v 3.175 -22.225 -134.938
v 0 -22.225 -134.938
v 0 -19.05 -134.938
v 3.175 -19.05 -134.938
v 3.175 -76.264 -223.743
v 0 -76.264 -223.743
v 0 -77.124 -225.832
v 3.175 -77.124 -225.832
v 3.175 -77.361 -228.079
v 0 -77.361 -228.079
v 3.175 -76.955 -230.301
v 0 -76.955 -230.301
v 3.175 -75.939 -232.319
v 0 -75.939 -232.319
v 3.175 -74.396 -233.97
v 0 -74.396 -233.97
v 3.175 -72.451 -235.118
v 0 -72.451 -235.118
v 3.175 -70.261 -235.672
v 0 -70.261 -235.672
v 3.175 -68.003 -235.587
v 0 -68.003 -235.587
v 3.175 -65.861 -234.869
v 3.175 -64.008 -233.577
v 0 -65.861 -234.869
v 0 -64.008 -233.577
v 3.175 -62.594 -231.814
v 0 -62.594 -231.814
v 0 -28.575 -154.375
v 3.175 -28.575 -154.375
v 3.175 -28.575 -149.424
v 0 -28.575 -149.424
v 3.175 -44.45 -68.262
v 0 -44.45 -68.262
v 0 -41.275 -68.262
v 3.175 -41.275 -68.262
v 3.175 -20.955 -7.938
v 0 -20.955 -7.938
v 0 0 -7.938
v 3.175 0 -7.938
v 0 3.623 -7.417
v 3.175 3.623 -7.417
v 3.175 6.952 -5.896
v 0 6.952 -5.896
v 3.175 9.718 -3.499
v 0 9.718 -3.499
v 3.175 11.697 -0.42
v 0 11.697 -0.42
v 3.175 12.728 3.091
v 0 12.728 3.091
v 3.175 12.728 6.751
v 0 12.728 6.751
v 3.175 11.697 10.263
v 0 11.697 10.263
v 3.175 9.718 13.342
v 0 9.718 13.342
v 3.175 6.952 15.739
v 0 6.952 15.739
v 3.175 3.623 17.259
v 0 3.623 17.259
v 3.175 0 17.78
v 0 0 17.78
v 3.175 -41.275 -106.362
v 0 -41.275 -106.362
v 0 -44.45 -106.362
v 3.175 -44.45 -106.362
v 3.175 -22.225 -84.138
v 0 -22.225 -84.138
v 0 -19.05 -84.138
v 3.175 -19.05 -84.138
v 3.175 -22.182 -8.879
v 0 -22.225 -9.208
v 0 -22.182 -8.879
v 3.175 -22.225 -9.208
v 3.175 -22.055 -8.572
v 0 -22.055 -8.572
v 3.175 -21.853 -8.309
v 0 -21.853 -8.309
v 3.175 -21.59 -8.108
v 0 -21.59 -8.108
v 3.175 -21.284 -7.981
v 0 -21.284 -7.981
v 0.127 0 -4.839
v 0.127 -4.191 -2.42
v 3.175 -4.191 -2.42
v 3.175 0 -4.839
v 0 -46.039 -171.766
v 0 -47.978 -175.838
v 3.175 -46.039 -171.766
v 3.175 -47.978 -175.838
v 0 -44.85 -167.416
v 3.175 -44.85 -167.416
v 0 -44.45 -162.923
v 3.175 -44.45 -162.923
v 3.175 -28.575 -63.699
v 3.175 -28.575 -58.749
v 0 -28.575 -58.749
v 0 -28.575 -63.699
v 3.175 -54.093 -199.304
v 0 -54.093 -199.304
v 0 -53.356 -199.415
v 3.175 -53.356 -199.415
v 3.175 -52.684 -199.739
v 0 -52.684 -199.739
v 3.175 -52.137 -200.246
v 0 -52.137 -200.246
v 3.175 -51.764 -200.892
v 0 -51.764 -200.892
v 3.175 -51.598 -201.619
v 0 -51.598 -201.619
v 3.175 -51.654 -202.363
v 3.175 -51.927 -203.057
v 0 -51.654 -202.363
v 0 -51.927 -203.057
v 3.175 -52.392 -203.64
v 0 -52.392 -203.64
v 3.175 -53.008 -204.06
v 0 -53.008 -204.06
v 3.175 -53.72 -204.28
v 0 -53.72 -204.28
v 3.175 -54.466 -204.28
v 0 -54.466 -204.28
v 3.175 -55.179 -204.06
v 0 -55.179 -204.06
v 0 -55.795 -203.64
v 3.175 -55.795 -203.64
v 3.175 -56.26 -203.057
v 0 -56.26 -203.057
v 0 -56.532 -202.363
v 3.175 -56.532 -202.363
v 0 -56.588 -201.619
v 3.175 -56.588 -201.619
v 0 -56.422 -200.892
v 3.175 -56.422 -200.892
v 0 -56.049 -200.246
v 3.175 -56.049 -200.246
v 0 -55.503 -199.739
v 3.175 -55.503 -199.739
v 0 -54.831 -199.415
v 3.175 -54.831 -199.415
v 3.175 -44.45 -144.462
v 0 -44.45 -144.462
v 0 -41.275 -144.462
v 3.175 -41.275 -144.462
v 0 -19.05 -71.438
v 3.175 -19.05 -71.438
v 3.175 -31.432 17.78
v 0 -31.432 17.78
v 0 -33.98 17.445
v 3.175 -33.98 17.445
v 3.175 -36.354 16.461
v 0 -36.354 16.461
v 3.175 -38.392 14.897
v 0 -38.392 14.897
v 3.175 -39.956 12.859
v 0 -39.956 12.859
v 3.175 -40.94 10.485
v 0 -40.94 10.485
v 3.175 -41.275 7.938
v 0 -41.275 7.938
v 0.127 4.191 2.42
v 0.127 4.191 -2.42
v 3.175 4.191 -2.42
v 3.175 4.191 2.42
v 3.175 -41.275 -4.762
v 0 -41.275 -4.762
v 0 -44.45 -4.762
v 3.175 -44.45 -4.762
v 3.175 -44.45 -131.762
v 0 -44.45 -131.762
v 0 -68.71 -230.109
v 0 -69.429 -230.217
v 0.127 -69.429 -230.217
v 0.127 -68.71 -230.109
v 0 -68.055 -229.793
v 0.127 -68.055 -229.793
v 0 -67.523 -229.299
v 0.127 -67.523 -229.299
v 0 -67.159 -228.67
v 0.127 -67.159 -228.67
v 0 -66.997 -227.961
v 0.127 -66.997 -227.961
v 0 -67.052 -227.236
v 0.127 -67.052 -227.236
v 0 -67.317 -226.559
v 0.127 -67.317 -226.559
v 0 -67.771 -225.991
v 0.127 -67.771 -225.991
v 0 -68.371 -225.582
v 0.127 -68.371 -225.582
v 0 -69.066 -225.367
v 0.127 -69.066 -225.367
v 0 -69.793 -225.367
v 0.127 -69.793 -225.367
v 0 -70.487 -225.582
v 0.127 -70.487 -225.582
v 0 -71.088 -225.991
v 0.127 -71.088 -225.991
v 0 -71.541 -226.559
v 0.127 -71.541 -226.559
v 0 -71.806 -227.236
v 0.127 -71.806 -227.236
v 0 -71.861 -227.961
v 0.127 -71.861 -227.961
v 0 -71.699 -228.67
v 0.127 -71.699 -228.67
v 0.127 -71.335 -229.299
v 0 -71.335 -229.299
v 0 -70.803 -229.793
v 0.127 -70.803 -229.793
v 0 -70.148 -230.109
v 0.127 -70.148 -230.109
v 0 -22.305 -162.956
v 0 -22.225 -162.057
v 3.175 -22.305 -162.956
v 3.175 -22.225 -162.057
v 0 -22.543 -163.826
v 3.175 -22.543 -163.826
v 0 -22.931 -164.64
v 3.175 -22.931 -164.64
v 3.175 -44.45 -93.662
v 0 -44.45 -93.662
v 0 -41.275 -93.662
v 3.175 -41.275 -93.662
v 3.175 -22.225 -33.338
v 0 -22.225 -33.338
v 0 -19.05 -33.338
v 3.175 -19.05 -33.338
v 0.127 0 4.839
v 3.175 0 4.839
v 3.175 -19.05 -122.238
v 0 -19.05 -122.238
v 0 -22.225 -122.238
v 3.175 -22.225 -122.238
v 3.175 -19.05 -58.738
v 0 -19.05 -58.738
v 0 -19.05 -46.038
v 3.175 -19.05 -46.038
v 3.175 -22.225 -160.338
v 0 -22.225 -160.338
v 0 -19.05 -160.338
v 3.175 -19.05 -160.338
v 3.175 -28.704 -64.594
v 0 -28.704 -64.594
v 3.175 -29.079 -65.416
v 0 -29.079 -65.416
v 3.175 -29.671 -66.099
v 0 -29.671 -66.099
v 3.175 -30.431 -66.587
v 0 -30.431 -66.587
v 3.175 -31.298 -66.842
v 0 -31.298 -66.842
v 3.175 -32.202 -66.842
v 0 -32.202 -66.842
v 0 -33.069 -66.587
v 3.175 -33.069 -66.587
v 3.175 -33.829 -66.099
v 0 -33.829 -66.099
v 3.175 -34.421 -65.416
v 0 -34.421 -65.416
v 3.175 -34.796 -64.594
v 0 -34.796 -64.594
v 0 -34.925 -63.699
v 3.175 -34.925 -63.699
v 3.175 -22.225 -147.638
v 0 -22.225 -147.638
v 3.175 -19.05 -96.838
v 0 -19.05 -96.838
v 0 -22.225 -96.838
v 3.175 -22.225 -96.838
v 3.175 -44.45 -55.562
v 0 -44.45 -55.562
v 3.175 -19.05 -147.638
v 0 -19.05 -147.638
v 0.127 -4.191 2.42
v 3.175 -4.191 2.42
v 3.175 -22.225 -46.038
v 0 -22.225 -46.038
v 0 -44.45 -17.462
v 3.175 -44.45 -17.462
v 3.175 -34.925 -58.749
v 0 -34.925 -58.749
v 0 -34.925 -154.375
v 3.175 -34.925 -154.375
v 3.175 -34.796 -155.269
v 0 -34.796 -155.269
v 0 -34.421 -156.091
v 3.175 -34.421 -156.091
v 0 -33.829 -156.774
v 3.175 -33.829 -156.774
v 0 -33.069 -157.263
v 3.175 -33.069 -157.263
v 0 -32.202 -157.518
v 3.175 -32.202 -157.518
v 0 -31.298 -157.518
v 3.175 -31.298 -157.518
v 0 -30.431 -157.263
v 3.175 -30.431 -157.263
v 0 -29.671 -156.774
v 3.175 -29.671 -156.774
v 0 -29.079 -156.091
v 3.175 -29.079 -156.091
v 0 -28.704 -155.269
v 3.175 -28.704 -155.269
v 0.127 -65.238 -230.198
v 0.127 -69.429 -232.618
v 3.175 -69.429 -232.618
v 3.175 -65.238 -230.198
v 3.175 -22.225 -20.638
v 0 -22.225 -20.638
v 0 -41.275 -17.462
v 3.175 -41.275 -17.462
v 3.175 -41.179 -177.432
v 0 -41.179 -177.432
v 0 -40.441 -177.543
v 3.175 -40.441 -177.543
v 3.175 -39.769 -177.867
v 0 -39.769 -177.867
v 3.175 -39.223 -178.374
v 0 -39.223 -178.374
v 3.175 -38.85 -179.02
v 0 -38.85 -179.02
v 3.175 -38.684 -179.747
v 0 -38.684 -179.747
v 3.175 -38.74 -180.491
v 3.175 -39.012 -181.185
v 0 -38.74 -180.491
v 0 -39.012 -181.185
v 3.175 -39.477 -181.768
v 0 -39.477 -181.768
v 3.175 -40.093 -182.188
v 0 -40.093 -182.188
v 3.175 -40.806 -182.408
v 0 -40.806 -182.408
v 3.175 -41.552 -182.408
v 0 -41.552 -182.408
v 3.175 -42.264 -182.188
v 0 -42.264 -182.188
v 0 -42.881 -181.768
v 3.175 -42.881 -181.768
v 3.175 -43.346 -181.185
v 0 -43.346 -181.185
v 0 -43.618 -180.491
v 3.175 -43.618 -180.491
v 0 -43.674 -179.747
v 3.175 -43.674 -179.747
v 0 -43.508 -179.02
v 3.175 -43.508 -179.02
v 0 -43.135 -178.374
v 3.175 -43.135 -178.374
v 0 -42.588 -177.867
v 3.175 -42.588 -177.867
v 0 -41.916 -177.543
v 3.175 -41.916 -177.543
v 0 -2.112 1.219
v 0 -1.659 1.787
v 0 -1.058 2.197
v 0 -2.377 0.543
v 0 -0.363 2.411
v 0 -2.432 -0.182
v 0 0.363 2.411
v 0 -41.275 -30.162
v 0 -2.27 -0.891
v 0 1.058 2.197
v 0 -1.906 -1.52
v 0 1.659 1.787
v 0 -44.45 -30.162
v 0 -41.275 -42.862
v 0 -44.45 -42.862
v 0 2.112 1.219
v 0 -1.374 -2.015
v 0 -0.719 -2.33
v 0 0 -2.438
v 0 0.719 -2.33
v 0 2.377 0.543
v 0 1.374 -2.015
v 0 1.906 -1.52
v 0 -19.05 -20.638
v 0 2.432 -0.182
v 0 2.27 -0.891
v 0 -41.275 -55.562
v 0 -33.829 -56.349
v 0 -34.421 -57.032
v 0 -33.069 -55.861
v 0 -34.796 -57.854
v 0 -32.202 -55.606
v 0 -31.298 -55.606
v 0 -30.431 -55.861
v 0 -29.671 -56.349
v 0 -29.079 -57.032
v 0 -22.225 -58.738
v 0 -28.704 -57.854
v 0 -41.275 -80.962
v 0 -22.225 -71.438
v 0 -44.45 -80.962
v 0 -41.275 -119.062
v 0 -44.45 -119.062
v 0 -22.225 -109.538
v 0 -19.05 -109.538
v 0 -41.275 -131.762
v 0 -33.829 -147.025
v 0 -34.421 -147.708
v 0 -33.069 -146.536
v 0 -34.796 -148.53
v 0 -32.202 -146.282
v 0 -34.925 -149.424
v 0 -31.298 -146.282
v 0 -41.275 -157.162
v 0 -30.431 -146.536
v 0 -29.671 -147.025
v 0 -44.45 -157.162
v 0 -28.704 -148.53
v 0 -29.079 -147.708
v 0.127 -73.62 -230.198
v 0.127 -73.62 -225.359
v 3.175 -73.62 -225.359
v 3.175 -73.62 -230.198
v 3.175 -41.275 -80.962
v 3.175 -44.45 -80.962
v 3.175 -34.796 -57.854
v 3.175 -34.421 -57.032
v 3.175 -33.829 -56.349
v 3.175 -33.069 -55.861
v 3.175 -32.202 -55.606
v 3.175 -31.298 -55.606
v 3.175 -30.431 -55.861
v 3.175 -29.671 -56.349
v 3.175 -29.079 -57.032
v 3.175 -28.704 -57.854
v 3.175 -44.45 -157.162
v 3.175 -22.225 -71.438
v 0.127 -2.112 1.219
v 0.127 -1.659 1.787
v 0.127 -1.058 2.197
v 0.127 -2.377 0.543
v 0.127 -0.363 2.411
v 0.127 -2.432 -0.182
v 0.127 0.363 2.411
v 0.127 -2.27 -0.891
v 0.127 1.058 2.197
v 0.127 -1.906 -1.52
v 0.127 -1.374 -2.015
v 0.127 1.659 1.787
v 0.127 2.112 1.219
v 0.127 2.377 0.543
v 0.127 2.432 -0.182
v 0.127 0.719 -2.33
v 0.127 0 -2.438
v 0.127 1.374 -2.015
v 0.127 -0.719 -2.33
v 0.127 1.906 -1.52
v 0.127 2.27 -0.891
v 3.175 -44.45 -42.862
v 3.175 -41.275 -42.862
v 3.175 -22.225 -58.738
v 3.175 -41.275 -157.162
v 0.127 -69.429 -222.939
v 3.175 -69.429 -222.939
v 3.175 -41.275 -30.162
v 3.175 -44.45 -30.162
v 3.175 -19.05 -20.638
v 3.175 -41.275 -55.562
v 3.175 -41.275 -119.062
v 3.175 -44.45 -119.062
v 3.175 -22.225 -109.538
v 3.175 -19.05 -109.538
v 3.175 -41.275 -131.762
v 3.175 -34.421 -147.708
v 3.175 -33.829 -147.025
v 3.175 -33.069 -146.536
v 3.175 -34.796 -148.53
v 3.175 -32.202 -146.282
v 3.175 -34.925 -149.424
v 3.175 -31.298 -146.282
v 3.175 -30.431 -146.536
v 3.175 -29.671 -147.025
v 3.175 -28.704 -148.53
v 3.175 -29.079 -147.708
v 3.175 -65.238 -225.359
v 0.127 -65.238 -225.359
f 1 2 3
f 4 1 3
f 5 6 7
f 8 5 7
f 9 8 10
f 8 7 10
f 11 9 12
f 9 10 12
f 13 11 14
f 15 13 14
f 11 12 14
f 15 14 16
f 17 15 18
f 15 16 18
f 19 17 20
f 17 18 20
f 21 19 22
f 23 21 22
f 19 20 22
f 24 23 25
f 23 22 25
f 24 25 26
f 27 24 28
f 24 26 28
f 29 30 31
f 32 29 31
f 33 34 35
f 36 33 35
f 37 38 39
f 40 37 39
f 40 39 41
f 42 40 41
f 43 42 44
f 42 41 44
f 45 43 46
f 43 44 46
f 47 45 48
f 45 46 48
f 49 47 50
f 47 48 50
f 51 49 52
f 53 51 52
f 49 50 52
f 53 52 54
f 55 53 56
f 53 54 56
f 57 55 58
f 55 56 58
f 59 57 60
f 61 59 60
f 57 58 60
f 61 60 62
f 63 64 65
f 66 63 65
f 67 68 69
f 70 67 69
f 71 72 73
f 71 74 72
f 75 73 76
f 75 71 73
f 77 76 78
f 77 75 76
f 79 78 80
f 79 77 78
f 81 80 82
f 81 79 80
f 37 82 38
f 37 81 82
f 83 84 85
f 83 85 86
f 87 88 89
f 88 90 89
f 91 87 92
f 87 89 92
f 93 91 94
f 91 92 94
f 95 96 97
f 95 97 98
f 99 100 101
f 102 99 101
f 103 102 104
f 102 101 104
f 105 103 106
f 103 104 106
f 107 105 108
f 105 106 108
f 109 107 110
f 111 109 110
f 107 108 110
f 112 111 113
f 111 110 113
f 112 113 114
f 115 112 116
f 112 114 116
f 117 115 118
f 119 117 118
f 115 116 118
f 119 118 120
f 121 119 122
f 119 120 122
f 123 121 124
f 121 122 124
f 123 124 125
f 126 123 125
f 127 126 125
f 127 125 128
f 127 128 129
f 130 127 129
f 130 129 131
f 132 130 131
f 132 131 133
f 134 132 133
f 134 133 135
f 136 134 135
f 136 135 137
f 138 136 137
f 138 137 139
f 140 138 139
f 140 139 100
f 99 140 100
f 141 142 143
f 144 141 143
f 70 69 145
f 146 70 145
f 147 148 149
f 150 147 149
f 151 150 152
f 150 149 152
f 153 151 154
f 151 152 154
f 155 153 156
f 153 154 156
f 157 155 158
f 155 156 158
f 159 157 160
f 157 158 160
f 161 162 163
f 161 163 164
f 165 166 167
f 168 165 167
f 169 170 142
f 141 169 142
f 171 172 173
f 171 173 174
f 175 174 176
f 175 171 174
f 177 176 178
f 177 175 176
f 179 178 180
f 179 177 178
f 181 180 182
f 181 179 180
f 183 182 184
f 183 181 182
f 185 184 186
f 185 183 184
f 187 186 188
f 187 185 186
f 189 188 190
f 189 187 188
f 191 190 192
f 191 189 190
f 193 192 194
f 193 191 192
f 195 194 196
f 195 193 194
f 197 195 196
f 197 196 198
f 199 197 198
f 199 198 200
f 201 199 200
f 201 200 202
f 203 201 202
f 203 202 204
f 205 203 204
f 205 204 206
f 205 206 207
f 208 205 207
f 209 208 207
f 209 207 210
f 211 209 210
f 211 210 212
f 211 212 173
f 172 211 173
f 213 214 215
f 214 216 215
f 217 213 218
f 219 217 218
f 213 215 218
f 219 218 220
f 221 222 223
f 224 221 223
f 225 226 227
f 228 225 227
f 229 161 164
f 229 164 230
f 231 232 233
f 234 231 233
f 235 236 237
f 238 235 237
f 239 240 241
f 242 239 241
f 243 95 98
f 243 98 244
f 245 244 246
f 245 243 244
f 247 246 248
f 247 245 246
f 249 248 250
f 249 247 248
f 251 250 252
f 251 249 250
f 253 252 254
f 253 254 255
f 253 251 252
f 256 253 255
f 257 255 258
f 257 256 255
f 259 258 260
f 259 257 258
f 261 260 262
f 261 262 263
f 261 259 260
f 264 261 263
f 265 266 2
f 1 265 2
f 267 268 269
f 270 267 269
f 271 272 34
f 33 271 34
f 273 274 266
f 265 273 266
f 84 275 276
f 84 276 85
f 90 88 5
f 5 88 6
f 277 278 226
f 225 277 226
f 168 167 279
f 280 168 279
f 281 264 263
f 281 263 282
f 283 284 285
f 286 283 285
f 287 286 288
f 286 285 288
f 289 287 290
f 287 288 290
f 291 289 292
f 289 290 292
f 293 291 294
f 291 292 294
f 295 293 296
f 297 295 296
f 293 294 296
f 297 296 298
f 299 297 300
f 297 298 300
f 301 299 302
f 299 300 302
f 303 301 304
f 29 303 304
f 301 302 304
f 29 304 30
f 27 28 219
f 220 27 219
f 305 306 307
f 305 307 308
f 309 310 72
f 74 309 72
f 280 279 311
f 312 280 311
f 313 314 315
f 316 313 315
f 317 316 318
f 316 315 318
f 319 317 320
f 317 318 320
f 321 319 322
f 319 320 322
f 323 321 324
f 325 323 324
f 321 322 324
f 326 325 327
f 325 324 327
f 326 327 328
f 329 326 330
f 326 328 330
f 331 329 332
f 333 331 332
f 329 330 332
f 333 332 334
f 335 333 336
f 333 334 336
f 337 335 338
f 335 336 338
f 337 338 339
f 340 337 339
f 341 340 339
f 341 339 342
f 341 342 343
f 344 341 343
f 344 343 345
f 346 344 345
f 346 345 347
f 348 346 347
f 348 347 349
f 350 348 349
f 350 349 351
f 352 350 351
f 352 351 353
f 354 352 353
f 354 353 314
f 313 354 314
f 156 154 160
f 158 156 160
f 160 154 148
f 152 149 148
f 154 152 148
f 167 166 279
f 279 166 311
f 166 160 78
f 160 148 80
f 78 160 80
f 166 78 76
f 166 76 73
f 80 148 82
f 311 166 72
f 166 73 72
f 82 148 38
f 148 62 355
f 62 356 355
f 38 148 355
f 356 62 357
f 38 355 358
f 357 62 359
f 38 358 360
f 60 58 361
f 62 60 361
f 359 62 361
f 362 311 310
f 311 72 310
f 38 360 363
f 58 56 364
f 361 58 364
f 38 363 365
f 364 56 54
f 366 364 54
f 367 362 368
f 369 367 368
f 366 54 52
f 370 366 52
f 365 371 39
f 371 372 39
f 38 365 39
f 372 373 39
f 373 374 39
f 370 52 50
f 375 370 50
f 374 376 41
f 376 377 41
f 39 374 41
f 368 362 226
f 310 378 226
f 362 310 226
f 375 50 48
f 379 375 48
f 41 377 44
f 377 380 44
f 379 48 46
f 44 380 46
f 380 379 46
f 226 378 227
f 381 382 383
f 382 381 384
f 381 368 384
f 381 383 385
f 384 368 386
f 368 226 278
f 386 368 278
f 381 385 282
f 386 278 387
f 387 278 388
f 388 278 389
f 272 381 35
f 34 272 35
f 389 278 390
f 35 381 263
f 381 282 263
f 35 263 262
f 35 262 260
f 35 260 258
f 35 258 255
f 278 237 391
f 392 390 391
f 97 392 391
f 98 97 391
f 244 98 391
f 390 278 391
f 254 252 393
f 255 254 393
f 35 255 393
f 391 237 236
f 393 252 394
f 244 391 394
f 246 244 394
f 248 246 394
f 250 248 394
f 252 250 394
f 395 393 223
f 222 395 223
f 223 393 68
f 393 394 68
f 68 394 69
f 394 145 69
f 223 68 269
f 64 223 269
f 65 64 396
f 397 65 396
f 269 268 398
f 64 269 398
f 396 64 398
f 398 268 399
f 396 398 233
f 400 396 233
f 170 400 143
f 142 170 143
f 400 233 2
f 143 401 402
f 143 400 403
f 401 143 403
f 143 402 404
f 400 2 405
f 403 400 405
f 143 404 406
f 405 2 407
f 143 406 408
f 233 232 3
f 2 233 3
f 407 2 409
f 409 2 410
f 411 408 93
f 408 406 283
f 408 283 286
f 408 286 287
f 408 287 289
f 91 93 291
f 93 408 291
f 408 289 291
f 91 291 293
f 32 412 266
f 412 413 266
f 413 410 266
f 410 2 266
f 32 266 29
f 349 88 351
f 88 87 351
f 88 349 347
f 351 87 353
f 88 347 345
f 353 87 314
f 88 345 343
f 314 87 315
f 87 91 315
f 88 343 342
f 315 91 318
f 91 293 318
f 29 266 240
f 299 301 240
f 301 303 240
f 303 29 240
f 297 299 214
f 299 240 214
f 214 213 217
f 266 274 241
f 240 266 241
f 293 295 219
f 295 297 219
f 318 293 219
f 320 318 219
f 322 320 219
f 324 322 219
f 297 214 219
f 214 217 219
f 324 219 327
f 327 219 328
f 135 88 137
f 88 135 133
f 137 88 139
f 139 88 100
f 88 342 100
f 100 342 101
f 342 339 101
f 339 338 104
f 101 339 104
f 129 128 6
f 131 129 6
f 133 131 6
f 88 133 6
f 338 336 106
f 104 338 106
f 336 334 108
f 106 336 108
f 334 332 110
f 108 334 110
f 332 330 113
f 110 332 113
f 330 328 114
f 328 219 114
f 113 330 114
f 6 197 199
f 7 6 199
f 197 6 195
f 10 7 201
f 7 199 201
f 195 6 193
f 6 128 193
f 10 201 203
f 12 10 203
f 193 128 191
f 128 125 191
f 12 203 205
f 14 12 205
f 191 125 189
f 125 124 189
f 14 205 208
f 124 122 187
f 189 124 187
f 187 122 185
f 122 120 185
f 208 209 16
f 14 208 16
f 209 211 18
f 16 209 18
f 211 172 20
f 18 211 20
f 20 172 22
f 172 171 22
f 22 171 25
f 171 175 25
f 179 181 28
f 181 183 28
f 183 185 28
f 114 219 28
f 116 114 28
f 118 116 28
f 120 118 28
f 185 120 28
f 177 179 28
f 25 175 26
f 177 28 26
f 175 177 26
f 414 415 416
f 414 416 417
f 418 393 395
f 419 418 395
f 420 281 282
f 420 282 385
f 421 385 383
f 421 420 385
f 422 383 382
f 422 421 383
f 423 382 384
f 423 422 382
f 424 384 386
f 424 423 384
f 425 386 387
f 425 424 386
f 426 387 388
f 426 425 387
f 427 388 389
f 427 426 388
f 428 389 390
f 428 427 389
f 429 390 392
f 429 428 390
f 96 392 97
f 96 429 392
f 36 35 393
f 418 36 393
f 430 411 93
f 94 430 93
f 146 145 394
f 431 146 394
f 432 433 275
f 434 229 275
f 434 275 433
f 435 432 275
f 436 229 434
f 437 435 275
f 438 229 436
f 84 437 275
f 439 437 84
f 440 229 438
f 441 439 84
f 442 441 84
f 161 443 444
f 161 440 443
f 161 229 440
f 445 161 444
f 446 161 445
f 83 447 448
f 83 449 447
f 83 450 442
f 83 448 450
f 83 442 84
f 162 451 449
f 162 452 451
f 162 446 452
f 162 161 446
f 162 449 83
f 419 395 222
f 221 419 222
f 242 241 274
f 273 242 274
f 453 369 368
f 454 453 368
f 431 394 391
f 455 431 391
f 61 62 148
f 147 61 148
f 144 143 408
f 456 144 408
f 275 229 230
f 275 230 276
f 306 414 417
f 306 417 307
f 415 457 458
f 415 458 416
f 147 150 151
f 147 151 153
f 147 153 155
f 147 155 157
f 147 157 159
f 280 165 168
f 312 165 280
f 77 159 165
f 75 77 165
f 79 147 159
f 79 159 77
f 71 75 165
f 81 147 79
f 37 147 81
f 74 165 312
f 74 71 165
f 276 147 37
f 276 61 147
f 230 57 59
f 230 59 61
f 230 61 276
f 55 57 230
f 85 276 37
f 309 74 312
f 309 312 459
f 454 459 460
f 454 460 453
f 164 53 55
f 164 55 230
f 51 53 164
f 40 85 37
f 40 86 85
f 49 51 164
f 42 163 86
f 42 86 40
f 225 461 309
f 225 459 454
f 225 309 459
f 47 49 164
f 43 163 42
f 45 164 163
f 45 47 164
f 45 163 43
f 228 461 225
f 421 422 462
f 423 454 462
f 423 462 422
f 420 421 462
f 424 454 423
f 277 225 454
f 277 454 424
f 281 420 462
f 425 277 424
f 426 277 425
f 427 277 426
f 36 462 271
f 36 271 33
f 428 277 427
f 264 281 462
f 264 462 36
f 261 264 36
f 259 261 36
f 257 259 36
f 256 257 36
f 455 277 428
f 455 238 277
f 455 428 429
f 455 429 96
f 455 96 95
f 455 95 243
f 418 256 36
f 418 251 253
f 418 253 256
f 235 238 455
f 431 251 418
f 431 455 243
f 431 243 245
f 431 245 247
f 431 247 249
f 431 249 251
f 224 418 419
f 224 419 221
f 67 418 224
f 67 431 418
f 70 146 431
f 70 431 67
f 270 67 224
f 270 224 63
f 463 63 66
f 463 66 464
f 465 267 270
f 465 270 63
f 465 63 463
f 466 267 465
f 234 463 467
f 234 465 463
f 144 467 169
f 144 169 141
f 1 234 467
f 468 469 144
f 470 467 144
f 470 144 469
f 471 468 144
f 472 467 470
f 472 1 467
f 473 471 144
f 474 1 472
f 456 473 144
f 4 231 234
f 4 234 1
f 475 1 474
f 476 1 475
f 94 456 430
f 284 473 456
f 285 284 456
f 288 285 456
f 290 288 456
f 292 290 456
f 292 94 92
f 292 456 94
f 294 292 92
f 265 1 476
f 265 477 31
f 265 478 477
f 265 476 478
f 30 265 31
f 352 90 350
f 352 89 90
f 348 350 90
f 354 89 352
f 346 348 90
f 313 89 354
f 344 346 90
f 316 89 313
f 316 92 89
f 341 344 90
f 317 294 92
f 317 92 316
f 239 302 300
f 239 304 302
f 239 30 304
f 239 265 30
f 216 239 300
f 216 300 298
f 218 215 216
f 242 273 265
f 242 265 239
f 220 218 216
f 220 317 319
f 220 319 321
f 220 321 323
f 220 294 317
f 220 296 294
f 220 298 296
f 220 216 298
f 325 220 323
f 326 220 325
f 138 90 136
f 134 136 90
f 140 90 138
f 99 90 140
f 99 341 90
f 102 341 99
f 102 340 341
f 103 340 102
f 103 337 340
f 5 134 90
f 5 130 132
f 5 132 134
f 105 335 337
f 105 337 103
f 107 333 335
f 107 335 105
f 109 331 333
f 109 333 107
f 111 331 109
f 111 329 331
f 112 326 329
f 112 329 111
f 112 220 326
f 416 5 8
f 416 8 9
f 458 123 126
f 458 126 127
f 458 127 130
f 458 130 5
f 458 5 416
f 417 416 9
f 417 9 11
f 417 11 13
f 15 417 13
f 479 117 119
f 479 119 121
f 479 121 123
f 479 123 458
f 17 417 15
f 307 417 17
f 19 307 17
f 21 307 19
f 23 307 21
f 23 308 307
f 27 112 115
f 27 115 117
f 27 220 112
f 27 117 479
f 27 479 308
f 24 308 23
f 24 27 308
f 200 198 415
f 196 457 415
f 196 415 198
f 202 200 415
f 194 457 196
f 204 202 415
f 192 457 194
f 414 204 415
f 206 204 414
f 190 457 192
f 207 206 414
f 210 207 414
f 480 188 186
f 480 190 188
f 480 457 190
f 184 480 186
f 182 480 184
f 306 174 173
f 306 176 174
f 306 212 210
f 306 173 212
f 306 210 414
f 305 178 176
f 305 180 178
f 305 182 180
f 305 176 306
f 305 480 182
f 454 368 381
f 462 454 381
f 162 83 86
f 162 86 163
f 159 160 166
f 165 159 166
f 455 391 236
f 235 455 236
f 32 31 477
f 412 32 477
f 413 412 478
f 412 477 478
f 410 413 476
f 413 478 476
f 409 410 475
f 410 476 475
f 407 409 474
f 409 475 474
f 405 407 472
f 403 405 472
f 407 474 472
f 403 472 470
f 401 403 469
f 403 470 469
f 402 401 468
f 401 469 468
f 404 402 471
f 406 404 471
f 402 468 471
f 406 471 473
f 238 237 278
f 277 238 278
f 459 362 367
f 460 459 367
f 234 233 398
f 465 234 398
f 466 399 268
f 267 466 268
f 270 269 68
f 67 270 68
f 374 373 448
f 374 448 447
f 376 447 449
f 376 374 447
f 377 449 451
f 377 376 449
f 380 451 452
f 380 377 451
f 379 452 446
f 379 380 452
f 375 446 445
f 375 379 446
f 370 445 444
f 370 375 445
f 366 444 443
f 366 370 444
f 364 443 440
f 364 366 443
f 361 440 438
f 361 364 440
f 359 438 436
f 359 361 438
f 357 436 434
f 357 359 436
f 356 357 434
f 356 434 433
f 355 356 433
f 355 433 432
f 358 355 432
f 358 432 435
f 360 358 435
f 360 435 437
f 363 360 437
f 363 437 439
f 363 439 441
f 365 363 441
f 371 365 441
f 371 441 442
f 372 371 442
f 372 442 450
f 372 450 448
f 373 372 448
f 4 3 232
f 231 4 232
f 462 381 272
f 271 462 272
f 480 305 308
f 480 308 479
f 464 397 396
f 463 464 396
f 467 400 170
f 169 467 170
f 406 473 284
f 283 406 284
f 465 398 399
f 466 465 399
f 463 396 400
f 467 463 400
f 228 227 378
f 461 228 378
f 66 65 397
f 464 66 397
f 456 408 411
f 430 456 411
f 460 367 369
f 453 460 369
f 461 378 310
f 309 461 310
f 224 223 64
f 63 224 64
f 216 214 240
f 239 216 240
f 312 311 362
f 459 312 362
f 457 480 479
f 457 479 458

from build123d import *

# Parameters (mm, degrees)
SKETCH1_R           = 2.4384
BOSS_EXTRUDE1_DEPTH = 3.175
CUT_EXTRUDE1_START  = -3.048
SKETCH2_R           = 2.4384
CUT_EXTRUDE1_DEPTH  = 3.048
CUT_EXTRUDE2_START  = -3.048
SKETCH3_R           = 2.4384
CUT_EXTRUDE2_DEPTH  = 3.048
SKETCH7_R           = 2.5019
CUT_EXTRUDE6_DEPTH  = 249.108397571
CUT_EXTRUDE7_DEPTH  = 3.175
FILLET1_R           = 25.4
FILLET2_R           = 1.27
FILLET5_R           = 5.08


with BuildPart() as part:
    # Sketch1 → Boss-Extrude1 (new body)
    with BuildSketch(Plane(origin=(0, 0, 0), x_dir=(0, 0, -1), z_dir=(1, 0, 0))):
        with BuildLine():
            ThreePointArc((223.742915845, -76.264038282), (234.613620352, -73.464824815), (231.814406885, -62.594120308))
            Line((231.814406885, -62.594120308), (163.445060929, -22.225))
            Line((163.445060929, -22.225), (160.3375, -22.225))
            Line((160.3375, -22.225), (160.3375, -19.05))
            Line((160.3375, -19.05), (147.6375, -19.05))
            Line((147.6375, -19.05), (147.6375, -22.225))
            Line((147.6375, -22.225), (134.9375, -22.225))
            Line((134.9375, -22.225), (134.9375, -19.05))
            Line((134.9375, -19.05), (122.2375, -19.05))
            Line((122.2375, -19.05), (122.2375, -22.225))
            Line((122.2375, -22.225), (109.5375, -22.225))
            Line((109.5375, -22.225), (109.5375, -19.05))
            Line((109.5375, -19.05), (96.8375, -19.05))
            Line((96.8375, -19.05), (96.8375, -22.225))
            Line((96.8375, -22.225), (84.1375, -22.225))
            Line((84.1375, -22.225), (84.1375, -19.05))
            Line((84.1375, -19.05), (71.4375, -19.05))
            Line((71.4375, -19.05), (71.4375, -22.225))
            Line((71.4375, -22.225), (58.7375, -22.225))
            Line((58.7375, -22.225), (58.7375, -19.05))
            Line((58.7375, -19.05), (46.0375, -19.05))
            Line((46.0375, -19.05), (46.0375, -22.225))
            Line((46.0375, -22.225), (33.3375, -22.225))
            Line((33.3375, -22.225), (33.3375, -19.05))
            Line((33.3375, -19.05), (20.6375, -19.05))
            Line((20.6375, -19.05), (20.6375, -22.225))
            Line((20.6375, -22.225), (7.9375, -22.225))
            Line((7.9375, -22.225), (7.9375, 0))
            ThreePointArc((7.9375, 0), (-4.92125, 12.85875), (-17.78, 0))
            Line((-17.78, 0), (-17.78, -31.4325))
            ThreePointArc((-17.78, -31.4325), (-14.897198494, -38.392198494), (-7.9375, -41.275))
            Line((-7.9375, -41.275), (4.7625, -41.275))
            Line((4.7625, -41.275), (4.7625, -44.45))
            Line((4.7625, -44.45), (17.4625, -44.45))
            Line((17.4625, -44.45), (17.4625, -41.275))
            Line((17.4625, -41.275), (30.1625, -41.275))
            Line((30.1625, -41.275), (30.1625, -44.45))
            Line((30.1625, -44.45), (42.8625, -44.45))
            Line((42.8625, -44.45), (42.8625, -41.275))
            Line((42.8625, -41.275), (55.5625, -41.275))
            Line((55.5625, -41.275), (55.5625, -44.45))
            Line((55.5625, -44.45), (68.2625, -44.45))
            Line((68.2625, -44.45), (68.2625, -41.275))
            Line((68.2625, -41.275), (80.9625, -41.275))
            Line((80.9625, -41.275), (80.9625, -44.45))
            Line((80.9625, -44.45), (93.6625, -44.45))
            Line((93.6625, -44.45), (93.6625, -41.275))
            Line((93.6625, -41.275), (106.3625, -41.275))
            Line((106.3625, -41.275), (106.3625, -44.45))
            Line((106.3625, -44.45), (119.0625, -44.45))
            Line((119.0625, -44.45), (119.0625, -41.275))
            Line((119.0625, -41.275), (131.7625, -41.275))
            Line((131.7625, -41.275), (131.7625, -44.45))
            Line((131.7625, -44.45), (144.4625, -44.45))
            Line((144.4625, -44.45), (144.4625, -41.275))
            Line((144.4625, -41.275), (157.1625, -41.275))
            Line((157.1625, -41.275), (157.1625, -44.45))
            Line((157.1625, -44.45), (169.8625, -44.45))
            Line((169.8625, -44.45), (223.742915845, -76.264038282))
        make_face()
        with Locations((227.778661365, -69.429079295)):
            Circle(SKETCH1_R, mode=Mode.SUBTRACT)
        Circle(SKETCH1_R, mode=Mode.SUBTRACT)
    extrude(amount=BOSS_EXTRUDE1_DEPTH)

    # Sketch2 → Cut-Extrude1 (cut)
    with BuildSketch(Plane(origin=(3.175, 0, 0), x_dir=(0, 0, -1), z_dir=(1, 0, 0)).offset(CUT_EXTRUDE1_START)):
        Polygon((2.419674978, 4.191), (-2.419674978, 4.191), (-4.839349956, 0), (-2.419674978, -4.191), (2.419674978, -4.191), (4.839349956, 0), align=None)
        Circle(SKETCH2_R, mode=Mode.SUBTRACT)
    extrude(amount=CUT_EXTRUDE1_DEPTH, mode=Mode.SUBTRACT)

    # Sketch3 → Cut-Extrude2 (cut)
    with BuildSketch(Plane(origin=(3.175, 0, 0), x_dir=(0, 0, -1), z_dir=(1, 0, 0)).offset(CUT_EXTRUDE2_START)):
        Polygon((230.198336343, -65.238079295), (225.358986387, -65.238079295), (222.939311409, -69.429079295), (225.358986387, -73.620079295), (230.198336343, -73.620079295), (232.618011321, -69.429079295), align=None)
        with Locations((227.778661365, -69.429079295)):
            Circle(SKETCH3_R, mode=Mode.SUBTRACT)
    extrude(amount=CUT_EXTRUDE2_DEPTH, mode=Mode.SUBTRACT)

    # Sketch7 → Cut-Extrude6 (cut, through all)
    with BuildSketch(Plane.ZY):
        with Locations((-201.805817216, -54.09324632)):
            Circle(SKETCH7_R)
        with Locations((-179.933948459, -41.178860656)):
            Circle(SKETCH7_R)
    extrude(amount=-CUT_EXTRUDE6_DEPTH, mode=Mode.SUBTRACT)

    # Sketch9 → Cut-Extrude7 (cut)
    with BuildSketch(Plane(origin=(3.175, 0, 0), x_dir=(0, 0, -1), z_dir=(1, 0, 0))):
        with BuildLine():
            Line((58.74893, -28.575), (63.69939, -28.575))
            ThreePointArc((63.69939, -28.575), (66.87439, -31.75), (63.69939, -34.925))
            Line((63.69939, -34.925), (58.74893, -34.925))
            ThreePointArc((58.74893, -34.925), (55.57393, -31.75), (58.74893, -28.575))
        make_face()
        with BuildLine():
            Line((154.37485, -28.575), (149.42439, -28.575))
            ThreePointArc((149.42439, -28.575), (146.24939, -31.75), (149.42439, -34.925))
            Line((149.42439, -34.925), (154.37485, -34.925))
            ThreePointArc((154.37485, -34.925), (157.54985, -31.75), (154.37485, -28.575))
        make_face()
    extrude(amount=-CUT_EXTRUDE7_DEPTH, mode=Mode.SUBTRACT)

    # Fillet1
    fillet1_edges = [part.edges().sort_by_distance(p)[0] for p in [
        (1.5875, -44.45, -169.8625),
    ]]
    fillet(fillet1_edges, radius=FILLET1_R)

    # Fillet2
    fillet2_edges = [part.edges().sort_by_distance(p)[0] for p in [
        (1.5875, -22.225, -7.9375),
    ]]
    fillet(fillet2_edges, radius=FILLET2_R)

    # Fillet5
    fillet5_edges = [part.edges().sort_by_distance(p)[0] for p in [
        (1.5875, -22.225, -163.445060929),
    ]]
    fillet(fillet5_edges, radius=FILLET5_R)


solid = part.part
